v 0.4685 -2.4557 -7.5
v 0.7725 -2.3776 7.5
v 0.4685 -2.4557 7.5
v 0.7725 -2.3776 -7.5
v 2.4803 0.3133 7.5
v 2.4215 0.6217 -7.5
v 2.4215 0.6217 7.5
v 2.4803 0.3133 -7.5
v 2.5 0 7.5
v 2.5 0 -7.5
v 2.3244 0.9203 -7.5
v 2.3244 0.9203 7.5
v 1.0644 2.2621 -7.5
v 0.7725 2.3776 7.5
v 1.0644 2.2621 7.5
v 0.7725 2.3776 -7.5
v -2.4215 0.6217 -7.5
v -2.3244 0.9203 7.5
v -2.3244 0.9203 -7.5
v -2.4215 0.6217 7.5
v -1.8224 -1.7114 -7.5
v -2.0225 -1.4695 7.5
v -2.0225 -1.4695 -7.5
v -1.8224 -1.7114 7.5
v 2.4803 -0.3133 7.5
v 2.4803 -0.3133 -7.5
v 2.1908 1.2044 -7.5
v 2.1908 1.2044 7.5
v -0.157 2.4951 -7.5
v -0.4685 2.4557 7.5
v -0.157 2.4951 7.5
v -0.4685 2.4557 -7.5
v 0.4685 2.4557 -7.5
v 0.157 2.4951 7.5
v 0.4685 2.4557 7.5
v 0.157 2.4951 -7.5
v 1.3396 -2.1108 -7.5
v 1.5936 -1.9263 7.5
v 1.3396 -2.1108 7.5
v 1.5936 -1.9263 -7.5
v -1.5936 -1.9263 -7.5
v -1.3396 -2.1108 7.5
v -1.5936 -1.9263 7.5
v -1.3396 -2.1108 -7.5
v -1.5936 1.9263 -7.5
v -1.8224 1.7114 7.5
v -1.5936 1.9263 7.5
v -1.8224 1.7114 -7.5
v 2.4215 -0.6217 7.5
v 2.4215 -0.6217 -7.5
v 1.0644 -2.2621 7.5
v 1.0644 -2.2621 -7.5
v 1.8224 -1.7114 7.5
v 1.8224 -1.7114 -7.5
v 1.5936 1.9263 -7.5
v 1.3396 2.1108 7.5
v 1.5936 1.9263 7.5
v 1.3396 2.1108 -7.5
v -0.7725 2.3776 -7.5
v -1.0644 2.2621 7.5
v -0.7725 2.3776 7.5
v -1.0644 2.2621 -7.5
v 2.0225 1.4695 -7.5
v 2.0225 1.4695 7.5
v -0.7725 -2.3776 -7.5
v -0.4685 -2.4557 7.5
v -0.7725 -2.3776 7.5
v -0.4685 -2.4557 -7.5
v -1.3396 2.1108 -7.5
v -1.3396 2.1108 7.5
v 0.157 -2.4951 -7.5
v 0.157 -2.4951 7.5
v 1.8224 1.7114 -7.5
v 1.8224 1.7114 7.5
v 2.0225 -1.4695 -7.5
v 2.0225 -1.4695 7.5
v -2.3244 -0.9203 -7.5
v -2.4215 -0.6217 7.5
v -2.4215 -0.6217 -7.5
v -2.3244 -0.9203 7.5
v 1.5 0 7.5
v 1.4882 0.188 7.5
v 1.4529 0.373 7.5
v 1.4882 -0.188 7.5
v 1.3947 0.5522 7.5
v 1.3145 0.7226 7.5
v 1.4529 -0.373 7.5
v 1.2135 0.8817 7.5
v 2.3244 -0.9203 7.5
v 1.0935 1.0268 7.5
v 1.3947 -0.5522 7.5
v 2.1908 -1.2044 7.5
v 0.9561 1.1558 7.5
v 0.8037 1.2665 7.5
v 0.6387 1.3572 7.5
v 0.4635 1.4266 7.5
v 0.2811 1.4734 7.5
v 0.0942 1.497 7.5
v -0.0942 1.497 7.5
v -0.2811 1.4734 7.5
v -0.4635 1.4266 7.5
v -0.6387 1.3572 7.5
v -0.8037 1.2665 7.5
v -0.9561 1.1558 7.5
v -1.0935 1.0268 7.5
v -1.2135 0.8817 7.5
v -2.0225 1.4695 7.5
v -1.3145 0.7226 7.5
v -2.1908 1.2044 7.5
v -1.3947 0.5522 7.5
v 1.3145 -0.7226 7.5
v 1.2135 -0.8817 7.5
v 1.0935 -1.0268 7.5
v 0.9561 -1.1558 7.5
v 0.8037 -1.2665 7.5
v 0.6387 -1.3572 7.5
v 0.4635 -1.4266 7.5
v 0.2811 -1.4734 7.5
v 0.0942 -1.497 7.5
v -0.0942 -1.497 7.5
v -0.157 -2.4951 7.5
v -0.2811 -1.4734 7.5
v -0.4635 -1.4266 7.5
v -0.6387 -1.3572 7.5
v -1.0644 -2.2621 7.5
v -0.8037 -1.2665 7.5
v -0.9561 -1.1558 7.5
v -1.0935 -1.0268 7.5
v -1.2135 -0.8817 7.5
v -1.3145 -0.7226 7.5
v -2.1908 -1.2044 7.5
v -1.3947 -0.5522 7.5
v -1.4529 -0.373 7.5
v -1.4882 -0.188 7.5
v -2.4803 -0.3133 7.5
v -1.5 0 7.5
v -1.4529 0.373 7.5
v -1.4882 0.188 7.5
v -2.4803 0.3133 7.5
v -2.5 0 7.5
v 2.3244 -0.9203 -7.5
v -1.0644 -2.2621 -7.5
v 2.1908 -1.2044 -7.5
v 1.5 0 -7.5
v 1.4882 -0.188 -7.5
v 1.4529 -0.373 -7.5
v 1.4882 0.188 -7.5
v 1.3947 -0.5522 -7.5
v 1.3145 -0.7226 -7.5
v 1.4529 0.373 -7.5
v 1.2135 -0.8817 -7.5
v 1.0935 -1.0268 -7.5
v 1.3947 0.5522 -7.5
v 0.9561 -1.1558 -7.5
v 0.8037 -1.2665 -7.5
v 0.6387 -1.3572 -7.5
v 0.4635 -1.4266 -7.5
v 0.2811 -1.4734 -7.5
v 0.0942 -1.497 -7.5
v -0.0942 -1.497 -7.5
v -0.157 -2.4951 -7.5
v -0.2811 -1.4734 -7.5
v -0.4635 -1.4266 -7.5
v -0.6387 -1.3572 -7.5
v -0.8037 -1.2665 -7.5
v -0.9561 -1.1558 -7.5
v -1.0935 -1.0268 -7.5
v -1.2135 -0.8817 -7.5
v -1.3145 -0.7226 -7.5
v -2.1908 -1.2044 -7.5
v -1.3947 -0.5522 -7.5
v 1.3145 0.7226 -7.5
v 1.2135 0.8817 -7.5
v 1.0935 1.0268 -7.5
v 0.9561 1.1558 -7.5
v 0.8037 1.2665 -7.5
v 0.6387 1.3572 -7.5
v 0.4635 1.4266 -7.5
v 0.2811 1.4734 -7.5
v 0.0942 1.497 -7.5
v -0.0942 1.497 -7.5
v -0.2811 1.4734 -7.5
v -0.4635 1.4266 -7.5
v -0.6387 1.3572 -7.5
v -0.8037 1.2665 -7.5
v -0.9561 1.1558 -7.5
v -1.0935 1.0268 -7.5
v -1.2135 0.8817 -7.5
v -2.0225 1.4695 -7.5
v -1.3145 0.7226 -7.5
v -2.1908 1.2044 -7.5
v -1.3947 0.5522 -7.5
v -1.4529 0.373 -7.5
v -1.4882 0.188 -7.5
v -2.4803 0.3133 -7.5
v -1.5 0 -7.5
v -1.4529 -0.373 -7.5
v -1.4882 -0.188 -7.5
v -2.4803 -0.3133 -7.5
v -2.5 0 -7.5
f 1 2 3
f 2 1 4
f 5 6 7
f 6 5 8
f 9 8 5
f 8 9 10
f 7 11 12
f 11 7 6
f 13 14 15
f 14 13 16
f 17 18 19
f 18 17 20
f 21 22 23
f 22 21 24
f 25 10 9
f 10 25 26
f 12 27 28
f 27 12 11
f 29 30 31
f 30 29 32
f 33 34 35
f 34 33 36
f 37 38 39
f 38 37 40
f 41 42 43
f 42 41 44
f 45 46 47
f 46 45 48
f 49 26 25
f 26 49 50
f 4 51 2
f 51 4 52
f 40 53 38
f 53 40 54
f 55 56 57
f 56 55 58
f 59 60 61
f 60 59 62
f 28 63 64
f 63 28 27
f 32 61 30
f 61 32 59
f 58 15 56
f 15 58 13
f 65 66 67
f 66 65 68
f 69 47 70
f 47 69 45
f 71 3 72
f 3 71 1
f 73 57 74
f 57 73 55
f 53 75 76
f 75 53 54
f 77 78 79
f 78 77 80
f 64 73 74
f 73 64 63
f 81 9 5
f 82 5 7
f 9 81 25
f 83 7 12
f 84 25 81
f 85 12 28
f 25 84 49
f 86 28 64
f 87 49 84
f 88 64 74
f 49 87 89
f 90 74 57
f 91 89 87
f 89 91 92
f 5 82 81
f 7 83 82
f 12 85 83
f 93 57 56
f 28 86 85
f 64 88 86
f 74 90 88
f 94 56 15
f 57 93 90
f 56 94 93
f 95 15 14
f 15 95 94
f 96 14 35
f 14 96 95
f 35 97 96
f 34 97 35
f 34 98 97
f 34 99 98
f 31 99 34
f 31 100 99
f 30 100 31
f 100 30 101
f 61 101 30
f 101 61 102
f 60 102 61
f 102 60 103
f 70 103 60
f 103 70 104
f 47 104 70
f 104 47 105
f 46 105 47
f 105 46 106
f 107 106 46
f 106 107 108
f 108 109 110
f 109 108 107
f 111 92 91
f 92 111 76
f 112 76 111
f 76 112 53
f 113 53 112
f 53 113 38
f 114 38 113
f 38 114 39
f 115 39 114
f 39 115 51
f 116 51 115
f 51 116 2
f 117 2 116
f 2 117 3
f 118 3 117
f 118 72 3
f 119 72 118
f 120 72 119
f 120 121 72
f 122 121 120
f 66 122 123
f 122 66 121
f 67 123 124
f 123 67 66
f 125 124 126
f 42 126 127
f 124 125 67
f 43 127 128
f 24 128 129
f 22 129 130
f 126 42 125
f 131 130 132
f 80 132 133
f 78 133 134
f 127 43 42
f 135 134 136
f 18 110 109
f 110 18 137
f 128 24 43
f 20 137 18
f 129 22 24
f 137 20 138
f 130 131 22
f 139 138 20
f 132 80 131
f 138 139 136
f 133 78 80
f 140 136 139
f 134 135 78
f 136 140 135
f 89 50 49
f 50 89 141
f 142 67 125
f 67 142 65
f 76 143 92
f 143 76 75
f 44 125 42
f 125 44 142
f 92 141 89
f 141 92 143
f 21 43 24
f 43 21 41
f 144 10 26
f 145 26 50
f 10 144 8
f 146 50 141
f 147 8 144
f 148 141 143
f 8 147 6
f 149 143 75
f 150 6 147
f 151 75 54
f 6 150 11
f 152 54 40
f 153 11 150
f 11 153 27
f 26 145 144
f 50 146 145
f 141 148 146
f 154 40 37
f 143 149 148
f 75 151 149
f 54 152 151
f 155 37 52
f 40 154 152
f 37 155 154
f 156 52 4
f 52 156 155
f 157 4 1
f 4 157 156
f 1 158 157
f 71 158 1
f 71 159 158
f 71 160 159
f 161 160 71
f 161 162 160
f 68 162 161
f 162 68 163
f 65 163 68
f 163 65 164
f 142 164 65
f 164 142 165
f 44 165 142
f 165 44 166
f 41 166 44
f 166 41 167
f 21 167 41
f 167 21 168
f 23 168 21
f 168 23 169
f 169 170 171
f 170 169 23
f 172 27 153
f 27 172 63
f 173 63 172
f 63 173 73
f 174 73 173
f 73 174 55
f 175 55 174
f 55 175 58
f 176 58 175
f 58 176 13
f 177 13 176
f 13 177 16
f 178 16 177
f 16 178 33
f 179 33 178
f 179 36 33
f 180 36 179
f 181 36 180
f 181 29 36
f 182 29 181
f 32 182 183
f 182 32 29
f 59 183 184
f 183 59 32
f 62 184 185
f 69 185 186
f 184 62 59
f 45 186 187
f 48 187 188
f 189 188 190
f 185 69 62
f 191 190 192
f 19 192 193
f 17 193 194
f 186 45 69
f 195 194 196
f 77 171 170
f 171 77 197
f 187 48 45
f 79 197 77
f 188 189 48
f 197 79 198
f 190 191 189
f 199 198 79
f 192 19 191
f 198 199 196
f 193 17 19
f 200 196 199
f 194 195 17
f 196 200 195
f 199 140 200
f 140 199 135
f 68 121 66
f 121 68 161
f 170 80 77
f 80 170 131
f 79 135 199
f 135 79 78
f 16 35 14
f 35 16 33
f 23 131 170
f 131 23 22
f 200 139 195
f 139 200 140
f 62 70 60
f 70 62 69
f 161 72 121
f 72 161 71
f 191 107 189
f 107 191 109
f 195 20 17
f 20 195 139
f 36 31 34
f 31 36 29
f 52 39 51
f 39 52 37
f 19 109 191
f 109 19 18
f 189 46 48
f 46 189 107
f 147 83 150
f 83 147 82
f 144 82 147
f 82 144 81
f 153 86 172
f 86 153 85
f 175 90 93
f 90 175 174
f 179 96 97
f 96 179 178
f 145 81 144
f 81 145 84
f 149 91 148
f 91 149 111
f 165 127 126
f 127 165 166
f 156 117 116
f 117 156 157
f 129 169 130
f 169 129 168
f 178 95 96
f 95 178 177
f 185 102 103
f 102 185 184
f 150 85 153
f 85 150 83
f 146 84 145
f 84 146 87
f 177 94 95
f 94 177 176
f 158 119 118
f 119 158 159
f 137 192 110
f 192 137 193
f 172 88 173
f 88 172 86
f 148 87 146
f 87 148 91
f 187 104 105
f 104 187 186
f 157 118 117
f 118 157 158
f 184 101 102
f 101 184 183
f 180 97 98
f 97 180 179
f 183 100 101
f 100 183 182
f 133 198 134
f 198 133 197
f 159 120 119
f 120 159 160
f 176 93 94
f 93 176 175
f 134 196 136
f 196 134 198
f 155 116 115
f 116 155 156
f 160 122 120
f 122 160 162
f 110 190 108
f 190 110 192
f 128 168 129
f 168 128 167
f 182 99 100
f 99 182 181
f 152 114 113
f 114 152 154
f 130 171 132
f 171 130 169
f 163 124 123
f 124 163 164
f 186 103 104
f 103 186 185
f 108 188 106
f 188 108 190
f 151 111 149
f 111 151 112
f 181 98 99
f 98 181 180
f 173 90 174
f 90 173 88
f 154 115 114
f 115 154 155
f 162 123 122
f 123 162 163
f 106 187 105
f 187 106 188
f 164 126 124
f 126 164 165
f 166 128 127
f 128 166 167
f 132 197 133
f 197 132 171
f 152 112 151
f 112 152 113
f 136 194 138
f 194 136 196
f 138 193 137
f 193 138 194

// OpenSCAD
$fn = 50;


difference() {
	union() {
		translate(v = [0, 0, -7.5000000000]) {
			cylinder(h = 15, r = 2.5000000000);
		}
	}
	union() {
		translate(v = [0, 0, -100.0000000000]) {
			cylinder(h = 200, r = 1.5000000000);
		}
	}
}
